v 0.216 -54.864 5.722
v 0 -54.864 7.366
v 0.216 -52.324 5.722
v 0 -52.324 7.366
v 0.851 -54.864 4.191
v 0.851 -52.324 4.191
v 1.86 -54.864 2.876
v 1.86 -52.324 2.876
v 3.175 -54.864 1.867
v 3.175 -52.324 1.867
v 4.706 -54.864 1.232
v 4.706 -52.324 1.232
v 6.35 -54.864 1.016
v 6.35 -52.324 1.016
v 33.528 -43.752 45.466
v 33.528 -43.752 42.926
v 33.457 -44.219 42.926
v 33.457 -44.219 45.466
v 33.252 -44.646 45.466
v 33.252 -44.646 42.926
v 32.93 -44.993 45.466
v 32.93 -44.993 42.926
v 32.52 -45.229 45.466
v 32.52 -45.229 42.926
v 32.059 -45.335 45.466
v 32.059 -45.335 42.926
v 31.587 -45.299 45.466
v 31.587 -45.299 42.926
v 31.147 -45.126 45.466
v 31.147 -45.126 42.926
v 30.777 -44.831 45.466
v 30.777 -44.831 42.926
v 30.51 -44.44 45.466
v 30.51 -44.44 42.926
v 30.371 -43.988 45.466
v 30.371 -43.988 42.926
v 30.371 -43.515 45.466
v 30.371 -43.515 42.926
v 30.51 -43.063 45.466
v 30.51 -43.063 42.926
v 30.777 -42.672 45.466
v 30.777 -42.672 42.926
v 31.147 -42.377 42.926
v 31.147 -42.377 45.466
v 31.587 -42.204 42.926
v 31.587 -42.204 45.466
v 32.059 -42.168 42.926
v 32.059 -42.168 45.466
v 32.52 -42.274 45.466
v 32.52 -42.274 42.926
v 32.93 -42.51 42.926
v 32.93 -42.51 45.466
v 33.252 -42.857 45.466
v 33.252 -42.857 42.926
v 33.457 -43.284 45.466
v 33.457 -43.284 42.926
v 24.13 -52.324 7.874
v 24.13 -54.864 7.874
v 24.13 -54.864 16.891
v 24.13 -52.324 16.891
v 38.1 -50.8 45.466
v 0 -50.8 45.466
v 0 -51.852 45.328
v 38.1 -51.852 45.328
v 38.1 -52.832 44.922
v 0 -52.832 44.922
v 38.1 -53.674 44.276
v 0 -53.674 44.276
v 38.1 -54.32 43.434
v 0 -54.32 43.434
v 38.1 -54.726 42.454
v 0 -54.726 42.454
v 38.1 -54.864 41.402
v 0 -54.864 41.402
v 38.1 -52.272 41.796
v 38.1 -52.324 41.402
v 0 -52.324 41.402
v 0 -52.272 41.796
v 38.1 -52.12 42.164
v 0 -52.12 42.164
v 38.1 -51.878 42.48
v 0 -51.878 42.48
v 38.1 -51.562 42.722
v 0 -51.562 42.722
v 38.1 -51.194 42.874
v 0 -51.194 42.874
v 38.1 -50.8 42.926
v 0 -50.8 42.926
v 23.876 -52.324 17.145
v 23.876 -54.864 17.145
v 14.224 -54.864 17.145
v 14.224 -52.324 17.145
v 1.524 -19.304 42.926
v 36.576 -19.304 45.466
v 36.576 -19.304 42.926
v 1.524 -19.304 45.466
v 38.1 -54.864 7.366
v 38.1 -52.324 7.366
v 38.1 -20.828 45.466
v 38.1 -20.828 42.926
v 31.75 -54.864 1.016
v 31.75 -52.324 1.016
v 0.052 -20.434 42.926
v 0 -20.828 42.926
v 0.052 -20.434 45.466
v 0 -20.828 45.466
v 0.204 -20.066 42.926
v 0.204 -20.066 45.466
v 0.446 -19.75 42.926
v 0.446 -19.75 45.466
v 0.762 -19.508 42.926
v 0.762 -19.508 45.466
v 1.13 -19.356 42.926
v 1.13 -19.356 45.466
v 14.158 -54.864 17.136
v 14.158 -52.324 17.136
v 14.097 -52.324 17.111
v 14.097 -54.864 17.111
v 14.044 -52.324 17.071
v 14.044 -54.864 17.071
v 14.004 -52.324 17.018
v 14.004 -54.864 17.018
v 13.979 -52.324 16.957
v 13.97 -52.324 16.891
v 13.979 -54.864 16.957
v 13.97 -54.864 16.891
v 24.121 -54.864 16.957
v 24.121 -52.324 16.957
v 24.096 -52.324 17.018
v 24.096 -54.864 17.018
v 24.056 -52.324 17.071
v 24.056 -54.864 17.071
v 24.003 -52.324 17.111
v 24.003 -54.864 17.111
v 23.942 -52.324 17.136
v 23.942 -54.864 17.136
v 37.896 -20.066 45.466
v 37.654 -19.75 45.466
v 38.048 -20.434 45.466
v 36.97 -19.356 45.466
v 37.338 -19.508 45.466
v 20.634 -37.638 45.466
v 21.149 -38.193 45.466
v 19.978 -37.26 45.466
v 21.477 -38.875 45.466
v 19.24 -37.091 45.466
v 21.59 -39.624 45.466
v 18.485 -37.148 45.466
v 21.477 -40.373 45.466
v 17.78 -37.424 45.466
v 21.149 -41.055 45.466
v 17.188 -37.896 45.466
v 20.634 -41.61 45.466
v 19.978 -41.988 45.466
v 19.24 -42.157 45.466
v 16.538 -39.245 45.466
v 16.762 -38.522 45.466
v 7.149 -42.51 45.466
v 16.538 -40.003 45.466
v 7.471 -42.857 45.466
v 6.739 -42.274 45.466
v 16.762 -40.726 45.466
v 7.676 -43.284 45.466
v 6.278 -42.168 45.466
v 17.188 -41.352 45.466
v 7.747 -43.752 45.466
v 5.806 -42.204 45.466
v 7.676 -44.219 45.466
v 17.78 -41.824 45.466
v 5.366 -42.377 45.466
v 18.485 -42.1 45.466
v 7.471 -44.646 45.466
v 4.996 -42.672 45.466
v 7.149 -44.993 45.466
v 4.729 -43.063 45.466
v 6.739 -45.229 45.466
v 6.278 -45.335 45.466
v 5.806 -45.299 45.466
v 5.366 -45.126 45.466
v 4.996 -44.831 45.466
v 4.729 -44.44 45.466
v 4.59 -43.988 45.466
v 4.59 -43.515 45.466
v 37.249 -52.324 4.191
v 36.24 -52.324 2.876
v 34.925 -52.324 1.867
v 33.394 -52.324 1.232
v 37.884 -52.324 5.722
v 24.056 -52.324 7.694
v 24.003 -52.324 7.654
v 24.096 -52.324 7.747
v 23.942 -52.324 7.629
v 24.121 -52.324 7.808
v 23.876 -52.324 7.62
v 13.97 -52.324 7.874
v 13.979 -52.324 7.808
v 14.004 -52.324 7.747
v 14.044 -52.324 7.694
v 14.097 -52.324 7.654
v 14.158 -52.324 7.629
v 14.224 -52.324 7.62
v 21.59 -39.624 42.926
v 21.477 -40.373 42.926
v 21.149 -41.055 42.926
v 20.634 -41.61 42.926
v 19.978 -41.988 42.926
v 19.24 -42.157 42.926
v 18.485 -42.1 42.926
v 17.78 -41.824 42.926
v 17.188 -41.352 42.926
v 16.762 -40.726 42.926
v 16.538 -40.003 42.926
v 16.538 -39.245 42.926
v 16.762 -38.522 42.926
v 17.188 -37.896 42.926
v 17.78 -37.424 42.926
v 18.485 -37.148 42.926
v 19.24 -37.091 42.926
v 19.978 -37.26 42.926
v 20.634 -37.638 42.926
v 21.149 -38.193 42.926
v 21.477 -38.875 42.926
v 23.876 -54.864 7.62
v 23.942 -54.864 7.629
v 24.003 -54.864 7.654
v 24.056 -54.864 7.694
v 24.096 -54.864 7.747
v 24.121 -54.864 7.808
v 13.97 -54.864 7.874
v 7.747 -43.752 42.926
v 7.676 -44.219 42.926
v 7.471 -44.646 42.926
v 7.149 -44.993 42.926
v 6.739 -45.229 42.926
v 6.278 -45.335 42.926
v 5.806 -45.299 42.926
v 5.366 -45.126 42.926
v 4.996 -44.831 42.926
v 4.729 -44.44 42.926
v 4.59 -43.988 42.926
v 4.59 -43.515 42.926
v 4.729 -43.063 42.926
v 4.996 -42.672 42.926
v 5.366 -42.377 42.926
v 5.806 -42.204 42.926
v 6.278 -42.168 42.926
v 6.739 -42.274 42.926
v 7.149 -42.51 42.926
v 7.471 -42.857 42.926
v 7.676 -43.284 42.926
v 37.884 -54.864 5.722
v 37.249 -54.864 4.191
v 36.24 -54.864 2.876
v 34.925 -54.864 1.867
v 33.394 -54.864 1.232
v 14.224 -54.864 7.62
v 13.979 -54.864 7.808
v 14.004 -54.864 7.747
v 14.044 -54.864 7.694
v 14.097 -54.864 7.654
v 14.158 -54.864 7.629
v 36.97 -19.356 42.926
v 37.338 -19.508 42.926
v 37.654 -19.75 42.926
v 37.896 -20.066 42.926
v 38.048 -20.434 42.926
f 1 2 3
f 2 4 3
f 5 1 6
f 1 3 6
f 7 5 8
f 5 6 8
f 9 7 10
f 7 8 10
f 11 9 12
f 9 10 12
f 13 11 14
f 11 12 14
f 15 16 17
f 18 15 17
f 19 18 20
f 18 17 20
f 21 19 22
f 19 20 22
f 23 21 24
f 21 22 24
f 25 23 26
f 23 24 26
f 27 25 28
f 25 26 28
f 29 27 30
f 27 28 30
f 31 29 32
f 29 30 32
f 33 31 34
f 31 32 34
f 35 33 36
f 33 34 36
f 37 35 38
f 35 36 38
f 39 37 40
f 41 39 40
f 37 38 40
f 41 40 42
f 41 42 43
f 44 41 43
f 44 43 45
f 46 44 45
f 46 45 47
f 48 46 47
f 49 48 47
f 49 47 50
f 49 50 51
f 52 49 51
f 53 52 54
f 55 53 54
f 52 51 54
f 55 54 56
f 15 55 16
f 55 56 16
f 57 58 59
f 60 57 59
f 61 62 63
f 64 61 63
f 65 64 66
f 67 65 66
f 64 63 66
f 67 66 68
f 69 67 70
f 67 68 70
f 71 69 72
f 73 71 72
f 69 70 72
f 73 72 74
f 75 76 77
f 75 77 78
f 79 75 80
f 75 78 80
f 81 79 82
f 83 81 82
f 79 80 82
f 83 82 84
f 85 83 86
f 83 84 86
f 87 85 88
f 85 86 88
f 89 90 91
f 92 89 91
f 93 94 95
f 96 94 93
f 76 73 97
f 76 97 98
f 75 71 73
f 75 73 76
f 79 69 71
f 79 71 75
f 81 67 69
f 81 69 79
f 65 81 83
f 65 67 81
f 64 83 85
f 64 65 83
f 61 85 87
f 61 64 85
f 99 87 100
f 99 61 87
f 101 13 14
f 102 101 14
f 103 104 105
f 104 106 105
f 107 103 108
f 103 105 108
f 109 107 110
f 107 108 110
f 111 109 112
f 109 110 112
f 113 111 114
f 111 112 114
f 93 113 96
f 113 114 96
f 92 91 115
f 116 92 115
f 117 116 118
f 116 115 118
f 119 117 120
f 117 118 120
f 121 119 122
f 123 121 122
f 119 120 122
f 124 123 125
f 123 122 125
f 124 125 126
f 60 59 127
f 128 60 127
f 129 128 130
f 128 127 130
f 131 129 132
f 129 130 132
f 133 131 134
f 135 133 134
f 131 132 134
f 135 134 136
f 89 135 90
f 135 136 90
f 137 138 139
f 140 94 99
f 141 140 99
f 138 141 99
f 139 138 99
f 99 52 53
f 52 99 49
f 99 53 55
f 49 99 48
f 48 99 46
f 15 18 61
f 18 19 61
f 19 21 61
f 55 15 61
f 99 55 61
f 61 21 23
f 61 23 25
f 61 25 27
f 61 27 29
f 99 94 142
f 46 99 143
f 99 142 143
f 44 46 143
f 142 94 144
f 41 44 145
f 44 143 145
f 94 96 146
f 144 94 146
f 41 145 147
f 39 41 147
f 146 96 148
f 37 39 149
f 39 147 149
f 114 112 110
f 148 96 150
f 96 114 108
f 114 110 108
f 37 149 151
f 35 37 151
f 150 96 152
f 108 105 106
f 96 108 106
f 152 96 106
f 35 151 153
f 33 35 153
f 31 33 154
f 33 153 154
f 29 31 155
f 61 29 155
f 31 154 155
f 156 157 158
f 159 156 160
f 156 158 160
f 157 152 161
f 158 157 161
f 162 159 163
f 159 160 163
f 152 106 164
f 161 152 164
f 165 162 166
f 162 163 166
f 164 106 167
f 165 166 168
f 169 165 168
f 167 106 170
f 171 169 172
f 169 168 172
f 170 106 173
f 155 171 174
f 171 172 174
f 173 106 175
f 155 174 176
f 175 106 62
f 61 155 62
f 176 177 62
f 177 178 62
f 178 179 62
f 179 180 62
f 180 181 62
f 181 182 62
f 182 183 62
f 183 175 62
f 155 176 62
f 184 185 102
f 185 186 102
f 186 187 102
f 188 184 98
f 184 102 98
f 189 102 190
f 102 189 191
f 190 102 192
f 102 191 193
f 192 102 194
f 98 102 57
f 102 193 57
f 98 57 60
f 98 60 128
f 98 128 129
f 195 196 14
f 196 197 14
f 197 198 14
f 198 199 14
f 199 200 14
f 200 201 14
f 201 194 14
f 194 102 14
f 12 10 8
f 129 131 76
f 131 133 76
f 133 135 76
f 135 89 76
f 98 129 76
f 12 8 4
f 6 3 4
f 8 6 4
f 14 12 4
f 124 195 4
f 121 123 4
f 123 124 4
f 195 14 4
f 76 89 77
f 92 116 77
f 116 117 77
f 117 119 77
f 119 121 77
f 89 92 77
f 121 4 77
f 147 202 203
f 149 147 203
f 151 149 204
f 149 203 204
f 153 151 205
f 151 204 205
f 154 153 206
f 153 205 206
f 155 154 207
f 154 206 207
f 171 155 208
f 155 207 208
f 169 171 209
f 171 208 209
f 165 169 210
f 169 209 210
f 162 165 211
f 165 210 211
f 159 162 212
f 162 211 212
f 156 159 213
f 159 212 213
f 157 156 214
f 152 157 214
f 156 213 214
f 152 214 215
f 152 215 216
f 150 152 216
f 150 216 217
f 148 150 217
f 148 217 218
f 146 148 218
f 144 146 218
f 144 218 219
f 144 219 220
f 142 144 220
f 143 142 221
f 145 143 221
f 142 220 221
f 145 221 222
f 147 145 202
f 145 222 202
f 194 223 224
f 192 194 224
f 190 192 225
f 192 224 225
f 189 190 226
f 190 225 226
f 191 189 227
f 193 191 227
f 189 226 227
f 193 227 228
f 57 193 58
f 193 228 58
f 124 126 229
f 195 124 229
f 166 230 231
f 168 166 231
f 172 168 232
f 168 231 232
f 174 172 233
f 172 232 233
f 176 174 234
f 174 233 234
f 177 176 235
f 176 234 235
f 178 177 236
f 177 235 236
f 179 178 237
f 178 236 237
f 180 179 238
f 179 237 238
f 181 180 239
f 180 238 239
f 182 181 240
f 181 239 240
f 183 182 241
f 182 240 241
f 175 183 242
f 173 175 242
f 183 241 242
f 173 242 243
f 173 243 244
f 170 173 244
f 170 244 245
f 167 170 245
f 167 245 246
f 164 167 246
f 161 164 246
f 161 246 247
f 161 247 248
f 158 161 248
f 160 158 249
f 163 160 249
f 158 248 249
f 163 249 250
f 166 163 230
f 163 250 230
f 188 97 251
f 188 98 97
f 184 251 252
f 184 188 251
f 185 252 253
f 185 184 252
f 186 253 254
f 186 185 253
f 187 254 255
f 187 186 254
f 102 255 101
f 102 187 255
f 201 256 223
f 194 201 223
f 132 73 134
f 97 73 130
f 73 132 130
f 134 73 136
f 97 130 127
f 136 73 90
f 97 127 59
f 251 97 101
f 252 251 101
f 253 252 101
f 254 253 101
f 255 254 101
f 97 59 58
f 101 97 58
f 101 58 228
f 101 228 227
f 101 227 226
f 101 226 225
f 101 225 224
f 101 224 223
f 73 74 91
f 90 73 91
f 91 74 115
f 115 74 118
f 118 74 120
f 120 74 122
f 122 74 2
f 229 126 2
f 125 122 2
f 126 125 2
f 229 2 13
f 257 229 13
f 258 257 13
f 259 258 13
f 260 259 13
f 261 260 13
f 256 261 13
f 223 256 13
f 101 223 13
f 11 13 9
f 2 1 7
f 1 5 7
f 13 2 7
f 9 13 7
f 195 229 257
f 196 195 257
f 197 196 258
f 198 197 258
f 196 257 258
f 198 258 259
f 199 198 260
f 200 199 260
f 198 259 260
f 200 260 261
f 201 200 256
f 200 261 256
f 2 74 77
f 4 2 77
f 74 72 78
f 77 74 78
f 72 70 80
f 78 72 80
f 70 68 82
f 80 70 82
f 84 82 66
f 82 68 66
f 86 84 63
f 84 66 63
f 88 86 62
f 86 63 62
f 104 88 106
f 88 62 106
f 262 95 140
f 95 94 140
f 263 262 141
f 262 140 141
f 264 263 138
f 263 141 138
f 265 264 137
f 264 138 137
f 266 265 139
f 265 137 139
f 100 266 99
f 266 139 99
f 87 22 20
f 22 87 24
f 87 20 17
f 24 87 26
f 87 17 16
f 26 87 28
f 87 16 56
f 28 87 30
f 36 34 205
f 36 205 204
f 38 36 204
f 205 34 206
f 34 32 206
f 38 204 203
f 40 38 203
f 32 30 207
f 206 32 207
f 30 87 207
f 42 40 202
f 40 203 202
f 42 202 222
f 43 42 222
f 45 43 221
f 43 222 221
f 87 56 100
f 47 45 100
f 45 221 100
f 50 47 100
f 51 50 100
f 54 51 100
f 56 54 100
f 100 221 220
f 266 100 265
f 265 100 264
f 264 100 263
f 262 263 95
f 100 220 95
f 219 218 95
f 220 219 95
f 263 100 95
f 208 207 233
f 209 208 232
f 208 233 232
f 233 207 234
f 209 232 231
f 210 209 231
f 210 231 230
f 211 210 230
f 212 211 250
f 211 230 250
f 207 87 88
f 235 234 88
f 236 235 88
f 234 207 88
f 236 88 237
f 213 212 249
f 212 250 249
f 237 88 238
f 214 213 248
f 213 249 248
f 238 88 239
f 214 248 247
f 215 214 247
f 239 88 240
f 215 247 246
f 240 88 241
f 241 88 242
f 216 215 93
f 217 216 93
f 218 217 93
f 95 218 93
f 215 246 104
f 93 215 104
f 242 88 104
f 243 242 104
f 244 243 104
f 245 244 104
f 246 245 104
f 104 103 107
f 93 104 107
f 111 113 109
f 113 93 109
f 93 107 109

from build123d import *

# Parameters (mm, degrees)
F1_DEPTH = 38.1
F2_R     = 1.524
F3_R     = 1.5875
F3_R_2   = 2.54
F4_DEPTH = 2.54
F6_DEPTH = 2.54
F7_R     = 6.35
F8_W     = 157.243733
F8_H     = 94.123651
F9_DEPTH = 19.05
F10_R    = 1.524


with BuildPart() as f1:
    # F0 (on Right) → F1 (new body)
    with BuildSketch(Plane.YZ):
        with BuildLine():
            Line((-54.864, 1.016), (-52.324, 1.016))
            Line((-52.324, 1.016), (-52.324, 41.402))
            ThreePointArc((-52.324, 41.402), (-51.877631, 42.479631), (-50.8, 42.926))
            Line((-50.8, 42.926), (-0.254, 42.926))
            Line((-0.254, 42.926), (-0.254, 45.466))
            Line((-0.254, 45.466), (-50.8, 45.466))
            ThreePointArc((-50.8, 45.466), (-53.673682, 44.275682), (-54.864, 41.402))
            Line((-54.864, 41.402), (-54.864, 1.016))
        make_face()
    extrude(amount=F1_DEPTH)

    # F2
    f2_edges = [f1.edges().sort_by_distance(p)[0] for p in [
        (0, -0.254, 44.196),
        (38.1, -0.254, 44.196),
    ]]
    fillet(f2_edges, radius=F2_R)

    # F3 (on face) → F4 (cut, through all)
    with BuildSketch(Plane(origin=(0, 0, 42.926), x_dir=(1, 0, 0), z_dir=(0, 0, -1))):
        with Locations((6.1595, 43.7515)):
            Circle(F3_R)
        with Locations((19.05, 39.624)):
            Circle(F3_R_2)
        with Locations((31.9405, 43.7515)):
            Circle(F3_R)
        with Locations((19.05, 7.874)):
            Circle(F3_R_2)
    extrude(amount=-F4_DEPTH, mode=Mode.SUBTRACT)

    # F5 (on face) → F6 (cut, through all)
    with BuildSketch(Plane.XZ.offset(54.864)):
        with BuildLine():
            ThreePointArc((13.97, 7.874), (14.044395, 7.694395), (14.224, 7.62))
            Line((14.224, 7.62), (23.876, 7.62))
            ThreePointArc((23.876, 7.62), (24.055605, 7.694395), (24.13, 7.874))
            Line((24.13, 7.874), (24.13, 16.891))
            ThreePointArc((24.13, 16.891), (24.055605, 17.070605), (23.876, 17.145))
            Line((23.876, 17.145), (14.224, 17.145))
            ThreePointArc((14.224, 17.145), (14.044395, 17.070605), (13.97, 16.891))
            Line((13.97, 16.891), (13.97, 7.874))
        make_face()
    extrude(amount=-F6_DEPTH, mode=Mode.SUBTRACT)

    # F7
    f7_edges = [f1.edges().sort_by_distance(p)[0] for p in [
        (38.1, -53.594, 1.016),
        (0, -53.594, 1.016),
    ]]
    fillet(f7_edges, radius=F7_R)

    # F8 (on face) → F9 (cut)
    with BuildSketch(Plane(origin=(0, -0.254, 0), x_dir=(-1, 0, 0), z_dir=(0, 1, 0))):
        with Locations((-60.055602, 67.589141)):
            Rectangle(F8_W, F8_H)
    extrude(amount=-F9_DEPTH, mode=Mode.SUBTRACT)

    # F10
    f10_edges = [f1.edges().sort_by_distance(p)[0] for p in [
        (38.1, -19.304, 44.196),
        (0, -19.304, 44.196),
    ]]
    fillet(f10_edges, radius=F10_R)


solid = f1.part
